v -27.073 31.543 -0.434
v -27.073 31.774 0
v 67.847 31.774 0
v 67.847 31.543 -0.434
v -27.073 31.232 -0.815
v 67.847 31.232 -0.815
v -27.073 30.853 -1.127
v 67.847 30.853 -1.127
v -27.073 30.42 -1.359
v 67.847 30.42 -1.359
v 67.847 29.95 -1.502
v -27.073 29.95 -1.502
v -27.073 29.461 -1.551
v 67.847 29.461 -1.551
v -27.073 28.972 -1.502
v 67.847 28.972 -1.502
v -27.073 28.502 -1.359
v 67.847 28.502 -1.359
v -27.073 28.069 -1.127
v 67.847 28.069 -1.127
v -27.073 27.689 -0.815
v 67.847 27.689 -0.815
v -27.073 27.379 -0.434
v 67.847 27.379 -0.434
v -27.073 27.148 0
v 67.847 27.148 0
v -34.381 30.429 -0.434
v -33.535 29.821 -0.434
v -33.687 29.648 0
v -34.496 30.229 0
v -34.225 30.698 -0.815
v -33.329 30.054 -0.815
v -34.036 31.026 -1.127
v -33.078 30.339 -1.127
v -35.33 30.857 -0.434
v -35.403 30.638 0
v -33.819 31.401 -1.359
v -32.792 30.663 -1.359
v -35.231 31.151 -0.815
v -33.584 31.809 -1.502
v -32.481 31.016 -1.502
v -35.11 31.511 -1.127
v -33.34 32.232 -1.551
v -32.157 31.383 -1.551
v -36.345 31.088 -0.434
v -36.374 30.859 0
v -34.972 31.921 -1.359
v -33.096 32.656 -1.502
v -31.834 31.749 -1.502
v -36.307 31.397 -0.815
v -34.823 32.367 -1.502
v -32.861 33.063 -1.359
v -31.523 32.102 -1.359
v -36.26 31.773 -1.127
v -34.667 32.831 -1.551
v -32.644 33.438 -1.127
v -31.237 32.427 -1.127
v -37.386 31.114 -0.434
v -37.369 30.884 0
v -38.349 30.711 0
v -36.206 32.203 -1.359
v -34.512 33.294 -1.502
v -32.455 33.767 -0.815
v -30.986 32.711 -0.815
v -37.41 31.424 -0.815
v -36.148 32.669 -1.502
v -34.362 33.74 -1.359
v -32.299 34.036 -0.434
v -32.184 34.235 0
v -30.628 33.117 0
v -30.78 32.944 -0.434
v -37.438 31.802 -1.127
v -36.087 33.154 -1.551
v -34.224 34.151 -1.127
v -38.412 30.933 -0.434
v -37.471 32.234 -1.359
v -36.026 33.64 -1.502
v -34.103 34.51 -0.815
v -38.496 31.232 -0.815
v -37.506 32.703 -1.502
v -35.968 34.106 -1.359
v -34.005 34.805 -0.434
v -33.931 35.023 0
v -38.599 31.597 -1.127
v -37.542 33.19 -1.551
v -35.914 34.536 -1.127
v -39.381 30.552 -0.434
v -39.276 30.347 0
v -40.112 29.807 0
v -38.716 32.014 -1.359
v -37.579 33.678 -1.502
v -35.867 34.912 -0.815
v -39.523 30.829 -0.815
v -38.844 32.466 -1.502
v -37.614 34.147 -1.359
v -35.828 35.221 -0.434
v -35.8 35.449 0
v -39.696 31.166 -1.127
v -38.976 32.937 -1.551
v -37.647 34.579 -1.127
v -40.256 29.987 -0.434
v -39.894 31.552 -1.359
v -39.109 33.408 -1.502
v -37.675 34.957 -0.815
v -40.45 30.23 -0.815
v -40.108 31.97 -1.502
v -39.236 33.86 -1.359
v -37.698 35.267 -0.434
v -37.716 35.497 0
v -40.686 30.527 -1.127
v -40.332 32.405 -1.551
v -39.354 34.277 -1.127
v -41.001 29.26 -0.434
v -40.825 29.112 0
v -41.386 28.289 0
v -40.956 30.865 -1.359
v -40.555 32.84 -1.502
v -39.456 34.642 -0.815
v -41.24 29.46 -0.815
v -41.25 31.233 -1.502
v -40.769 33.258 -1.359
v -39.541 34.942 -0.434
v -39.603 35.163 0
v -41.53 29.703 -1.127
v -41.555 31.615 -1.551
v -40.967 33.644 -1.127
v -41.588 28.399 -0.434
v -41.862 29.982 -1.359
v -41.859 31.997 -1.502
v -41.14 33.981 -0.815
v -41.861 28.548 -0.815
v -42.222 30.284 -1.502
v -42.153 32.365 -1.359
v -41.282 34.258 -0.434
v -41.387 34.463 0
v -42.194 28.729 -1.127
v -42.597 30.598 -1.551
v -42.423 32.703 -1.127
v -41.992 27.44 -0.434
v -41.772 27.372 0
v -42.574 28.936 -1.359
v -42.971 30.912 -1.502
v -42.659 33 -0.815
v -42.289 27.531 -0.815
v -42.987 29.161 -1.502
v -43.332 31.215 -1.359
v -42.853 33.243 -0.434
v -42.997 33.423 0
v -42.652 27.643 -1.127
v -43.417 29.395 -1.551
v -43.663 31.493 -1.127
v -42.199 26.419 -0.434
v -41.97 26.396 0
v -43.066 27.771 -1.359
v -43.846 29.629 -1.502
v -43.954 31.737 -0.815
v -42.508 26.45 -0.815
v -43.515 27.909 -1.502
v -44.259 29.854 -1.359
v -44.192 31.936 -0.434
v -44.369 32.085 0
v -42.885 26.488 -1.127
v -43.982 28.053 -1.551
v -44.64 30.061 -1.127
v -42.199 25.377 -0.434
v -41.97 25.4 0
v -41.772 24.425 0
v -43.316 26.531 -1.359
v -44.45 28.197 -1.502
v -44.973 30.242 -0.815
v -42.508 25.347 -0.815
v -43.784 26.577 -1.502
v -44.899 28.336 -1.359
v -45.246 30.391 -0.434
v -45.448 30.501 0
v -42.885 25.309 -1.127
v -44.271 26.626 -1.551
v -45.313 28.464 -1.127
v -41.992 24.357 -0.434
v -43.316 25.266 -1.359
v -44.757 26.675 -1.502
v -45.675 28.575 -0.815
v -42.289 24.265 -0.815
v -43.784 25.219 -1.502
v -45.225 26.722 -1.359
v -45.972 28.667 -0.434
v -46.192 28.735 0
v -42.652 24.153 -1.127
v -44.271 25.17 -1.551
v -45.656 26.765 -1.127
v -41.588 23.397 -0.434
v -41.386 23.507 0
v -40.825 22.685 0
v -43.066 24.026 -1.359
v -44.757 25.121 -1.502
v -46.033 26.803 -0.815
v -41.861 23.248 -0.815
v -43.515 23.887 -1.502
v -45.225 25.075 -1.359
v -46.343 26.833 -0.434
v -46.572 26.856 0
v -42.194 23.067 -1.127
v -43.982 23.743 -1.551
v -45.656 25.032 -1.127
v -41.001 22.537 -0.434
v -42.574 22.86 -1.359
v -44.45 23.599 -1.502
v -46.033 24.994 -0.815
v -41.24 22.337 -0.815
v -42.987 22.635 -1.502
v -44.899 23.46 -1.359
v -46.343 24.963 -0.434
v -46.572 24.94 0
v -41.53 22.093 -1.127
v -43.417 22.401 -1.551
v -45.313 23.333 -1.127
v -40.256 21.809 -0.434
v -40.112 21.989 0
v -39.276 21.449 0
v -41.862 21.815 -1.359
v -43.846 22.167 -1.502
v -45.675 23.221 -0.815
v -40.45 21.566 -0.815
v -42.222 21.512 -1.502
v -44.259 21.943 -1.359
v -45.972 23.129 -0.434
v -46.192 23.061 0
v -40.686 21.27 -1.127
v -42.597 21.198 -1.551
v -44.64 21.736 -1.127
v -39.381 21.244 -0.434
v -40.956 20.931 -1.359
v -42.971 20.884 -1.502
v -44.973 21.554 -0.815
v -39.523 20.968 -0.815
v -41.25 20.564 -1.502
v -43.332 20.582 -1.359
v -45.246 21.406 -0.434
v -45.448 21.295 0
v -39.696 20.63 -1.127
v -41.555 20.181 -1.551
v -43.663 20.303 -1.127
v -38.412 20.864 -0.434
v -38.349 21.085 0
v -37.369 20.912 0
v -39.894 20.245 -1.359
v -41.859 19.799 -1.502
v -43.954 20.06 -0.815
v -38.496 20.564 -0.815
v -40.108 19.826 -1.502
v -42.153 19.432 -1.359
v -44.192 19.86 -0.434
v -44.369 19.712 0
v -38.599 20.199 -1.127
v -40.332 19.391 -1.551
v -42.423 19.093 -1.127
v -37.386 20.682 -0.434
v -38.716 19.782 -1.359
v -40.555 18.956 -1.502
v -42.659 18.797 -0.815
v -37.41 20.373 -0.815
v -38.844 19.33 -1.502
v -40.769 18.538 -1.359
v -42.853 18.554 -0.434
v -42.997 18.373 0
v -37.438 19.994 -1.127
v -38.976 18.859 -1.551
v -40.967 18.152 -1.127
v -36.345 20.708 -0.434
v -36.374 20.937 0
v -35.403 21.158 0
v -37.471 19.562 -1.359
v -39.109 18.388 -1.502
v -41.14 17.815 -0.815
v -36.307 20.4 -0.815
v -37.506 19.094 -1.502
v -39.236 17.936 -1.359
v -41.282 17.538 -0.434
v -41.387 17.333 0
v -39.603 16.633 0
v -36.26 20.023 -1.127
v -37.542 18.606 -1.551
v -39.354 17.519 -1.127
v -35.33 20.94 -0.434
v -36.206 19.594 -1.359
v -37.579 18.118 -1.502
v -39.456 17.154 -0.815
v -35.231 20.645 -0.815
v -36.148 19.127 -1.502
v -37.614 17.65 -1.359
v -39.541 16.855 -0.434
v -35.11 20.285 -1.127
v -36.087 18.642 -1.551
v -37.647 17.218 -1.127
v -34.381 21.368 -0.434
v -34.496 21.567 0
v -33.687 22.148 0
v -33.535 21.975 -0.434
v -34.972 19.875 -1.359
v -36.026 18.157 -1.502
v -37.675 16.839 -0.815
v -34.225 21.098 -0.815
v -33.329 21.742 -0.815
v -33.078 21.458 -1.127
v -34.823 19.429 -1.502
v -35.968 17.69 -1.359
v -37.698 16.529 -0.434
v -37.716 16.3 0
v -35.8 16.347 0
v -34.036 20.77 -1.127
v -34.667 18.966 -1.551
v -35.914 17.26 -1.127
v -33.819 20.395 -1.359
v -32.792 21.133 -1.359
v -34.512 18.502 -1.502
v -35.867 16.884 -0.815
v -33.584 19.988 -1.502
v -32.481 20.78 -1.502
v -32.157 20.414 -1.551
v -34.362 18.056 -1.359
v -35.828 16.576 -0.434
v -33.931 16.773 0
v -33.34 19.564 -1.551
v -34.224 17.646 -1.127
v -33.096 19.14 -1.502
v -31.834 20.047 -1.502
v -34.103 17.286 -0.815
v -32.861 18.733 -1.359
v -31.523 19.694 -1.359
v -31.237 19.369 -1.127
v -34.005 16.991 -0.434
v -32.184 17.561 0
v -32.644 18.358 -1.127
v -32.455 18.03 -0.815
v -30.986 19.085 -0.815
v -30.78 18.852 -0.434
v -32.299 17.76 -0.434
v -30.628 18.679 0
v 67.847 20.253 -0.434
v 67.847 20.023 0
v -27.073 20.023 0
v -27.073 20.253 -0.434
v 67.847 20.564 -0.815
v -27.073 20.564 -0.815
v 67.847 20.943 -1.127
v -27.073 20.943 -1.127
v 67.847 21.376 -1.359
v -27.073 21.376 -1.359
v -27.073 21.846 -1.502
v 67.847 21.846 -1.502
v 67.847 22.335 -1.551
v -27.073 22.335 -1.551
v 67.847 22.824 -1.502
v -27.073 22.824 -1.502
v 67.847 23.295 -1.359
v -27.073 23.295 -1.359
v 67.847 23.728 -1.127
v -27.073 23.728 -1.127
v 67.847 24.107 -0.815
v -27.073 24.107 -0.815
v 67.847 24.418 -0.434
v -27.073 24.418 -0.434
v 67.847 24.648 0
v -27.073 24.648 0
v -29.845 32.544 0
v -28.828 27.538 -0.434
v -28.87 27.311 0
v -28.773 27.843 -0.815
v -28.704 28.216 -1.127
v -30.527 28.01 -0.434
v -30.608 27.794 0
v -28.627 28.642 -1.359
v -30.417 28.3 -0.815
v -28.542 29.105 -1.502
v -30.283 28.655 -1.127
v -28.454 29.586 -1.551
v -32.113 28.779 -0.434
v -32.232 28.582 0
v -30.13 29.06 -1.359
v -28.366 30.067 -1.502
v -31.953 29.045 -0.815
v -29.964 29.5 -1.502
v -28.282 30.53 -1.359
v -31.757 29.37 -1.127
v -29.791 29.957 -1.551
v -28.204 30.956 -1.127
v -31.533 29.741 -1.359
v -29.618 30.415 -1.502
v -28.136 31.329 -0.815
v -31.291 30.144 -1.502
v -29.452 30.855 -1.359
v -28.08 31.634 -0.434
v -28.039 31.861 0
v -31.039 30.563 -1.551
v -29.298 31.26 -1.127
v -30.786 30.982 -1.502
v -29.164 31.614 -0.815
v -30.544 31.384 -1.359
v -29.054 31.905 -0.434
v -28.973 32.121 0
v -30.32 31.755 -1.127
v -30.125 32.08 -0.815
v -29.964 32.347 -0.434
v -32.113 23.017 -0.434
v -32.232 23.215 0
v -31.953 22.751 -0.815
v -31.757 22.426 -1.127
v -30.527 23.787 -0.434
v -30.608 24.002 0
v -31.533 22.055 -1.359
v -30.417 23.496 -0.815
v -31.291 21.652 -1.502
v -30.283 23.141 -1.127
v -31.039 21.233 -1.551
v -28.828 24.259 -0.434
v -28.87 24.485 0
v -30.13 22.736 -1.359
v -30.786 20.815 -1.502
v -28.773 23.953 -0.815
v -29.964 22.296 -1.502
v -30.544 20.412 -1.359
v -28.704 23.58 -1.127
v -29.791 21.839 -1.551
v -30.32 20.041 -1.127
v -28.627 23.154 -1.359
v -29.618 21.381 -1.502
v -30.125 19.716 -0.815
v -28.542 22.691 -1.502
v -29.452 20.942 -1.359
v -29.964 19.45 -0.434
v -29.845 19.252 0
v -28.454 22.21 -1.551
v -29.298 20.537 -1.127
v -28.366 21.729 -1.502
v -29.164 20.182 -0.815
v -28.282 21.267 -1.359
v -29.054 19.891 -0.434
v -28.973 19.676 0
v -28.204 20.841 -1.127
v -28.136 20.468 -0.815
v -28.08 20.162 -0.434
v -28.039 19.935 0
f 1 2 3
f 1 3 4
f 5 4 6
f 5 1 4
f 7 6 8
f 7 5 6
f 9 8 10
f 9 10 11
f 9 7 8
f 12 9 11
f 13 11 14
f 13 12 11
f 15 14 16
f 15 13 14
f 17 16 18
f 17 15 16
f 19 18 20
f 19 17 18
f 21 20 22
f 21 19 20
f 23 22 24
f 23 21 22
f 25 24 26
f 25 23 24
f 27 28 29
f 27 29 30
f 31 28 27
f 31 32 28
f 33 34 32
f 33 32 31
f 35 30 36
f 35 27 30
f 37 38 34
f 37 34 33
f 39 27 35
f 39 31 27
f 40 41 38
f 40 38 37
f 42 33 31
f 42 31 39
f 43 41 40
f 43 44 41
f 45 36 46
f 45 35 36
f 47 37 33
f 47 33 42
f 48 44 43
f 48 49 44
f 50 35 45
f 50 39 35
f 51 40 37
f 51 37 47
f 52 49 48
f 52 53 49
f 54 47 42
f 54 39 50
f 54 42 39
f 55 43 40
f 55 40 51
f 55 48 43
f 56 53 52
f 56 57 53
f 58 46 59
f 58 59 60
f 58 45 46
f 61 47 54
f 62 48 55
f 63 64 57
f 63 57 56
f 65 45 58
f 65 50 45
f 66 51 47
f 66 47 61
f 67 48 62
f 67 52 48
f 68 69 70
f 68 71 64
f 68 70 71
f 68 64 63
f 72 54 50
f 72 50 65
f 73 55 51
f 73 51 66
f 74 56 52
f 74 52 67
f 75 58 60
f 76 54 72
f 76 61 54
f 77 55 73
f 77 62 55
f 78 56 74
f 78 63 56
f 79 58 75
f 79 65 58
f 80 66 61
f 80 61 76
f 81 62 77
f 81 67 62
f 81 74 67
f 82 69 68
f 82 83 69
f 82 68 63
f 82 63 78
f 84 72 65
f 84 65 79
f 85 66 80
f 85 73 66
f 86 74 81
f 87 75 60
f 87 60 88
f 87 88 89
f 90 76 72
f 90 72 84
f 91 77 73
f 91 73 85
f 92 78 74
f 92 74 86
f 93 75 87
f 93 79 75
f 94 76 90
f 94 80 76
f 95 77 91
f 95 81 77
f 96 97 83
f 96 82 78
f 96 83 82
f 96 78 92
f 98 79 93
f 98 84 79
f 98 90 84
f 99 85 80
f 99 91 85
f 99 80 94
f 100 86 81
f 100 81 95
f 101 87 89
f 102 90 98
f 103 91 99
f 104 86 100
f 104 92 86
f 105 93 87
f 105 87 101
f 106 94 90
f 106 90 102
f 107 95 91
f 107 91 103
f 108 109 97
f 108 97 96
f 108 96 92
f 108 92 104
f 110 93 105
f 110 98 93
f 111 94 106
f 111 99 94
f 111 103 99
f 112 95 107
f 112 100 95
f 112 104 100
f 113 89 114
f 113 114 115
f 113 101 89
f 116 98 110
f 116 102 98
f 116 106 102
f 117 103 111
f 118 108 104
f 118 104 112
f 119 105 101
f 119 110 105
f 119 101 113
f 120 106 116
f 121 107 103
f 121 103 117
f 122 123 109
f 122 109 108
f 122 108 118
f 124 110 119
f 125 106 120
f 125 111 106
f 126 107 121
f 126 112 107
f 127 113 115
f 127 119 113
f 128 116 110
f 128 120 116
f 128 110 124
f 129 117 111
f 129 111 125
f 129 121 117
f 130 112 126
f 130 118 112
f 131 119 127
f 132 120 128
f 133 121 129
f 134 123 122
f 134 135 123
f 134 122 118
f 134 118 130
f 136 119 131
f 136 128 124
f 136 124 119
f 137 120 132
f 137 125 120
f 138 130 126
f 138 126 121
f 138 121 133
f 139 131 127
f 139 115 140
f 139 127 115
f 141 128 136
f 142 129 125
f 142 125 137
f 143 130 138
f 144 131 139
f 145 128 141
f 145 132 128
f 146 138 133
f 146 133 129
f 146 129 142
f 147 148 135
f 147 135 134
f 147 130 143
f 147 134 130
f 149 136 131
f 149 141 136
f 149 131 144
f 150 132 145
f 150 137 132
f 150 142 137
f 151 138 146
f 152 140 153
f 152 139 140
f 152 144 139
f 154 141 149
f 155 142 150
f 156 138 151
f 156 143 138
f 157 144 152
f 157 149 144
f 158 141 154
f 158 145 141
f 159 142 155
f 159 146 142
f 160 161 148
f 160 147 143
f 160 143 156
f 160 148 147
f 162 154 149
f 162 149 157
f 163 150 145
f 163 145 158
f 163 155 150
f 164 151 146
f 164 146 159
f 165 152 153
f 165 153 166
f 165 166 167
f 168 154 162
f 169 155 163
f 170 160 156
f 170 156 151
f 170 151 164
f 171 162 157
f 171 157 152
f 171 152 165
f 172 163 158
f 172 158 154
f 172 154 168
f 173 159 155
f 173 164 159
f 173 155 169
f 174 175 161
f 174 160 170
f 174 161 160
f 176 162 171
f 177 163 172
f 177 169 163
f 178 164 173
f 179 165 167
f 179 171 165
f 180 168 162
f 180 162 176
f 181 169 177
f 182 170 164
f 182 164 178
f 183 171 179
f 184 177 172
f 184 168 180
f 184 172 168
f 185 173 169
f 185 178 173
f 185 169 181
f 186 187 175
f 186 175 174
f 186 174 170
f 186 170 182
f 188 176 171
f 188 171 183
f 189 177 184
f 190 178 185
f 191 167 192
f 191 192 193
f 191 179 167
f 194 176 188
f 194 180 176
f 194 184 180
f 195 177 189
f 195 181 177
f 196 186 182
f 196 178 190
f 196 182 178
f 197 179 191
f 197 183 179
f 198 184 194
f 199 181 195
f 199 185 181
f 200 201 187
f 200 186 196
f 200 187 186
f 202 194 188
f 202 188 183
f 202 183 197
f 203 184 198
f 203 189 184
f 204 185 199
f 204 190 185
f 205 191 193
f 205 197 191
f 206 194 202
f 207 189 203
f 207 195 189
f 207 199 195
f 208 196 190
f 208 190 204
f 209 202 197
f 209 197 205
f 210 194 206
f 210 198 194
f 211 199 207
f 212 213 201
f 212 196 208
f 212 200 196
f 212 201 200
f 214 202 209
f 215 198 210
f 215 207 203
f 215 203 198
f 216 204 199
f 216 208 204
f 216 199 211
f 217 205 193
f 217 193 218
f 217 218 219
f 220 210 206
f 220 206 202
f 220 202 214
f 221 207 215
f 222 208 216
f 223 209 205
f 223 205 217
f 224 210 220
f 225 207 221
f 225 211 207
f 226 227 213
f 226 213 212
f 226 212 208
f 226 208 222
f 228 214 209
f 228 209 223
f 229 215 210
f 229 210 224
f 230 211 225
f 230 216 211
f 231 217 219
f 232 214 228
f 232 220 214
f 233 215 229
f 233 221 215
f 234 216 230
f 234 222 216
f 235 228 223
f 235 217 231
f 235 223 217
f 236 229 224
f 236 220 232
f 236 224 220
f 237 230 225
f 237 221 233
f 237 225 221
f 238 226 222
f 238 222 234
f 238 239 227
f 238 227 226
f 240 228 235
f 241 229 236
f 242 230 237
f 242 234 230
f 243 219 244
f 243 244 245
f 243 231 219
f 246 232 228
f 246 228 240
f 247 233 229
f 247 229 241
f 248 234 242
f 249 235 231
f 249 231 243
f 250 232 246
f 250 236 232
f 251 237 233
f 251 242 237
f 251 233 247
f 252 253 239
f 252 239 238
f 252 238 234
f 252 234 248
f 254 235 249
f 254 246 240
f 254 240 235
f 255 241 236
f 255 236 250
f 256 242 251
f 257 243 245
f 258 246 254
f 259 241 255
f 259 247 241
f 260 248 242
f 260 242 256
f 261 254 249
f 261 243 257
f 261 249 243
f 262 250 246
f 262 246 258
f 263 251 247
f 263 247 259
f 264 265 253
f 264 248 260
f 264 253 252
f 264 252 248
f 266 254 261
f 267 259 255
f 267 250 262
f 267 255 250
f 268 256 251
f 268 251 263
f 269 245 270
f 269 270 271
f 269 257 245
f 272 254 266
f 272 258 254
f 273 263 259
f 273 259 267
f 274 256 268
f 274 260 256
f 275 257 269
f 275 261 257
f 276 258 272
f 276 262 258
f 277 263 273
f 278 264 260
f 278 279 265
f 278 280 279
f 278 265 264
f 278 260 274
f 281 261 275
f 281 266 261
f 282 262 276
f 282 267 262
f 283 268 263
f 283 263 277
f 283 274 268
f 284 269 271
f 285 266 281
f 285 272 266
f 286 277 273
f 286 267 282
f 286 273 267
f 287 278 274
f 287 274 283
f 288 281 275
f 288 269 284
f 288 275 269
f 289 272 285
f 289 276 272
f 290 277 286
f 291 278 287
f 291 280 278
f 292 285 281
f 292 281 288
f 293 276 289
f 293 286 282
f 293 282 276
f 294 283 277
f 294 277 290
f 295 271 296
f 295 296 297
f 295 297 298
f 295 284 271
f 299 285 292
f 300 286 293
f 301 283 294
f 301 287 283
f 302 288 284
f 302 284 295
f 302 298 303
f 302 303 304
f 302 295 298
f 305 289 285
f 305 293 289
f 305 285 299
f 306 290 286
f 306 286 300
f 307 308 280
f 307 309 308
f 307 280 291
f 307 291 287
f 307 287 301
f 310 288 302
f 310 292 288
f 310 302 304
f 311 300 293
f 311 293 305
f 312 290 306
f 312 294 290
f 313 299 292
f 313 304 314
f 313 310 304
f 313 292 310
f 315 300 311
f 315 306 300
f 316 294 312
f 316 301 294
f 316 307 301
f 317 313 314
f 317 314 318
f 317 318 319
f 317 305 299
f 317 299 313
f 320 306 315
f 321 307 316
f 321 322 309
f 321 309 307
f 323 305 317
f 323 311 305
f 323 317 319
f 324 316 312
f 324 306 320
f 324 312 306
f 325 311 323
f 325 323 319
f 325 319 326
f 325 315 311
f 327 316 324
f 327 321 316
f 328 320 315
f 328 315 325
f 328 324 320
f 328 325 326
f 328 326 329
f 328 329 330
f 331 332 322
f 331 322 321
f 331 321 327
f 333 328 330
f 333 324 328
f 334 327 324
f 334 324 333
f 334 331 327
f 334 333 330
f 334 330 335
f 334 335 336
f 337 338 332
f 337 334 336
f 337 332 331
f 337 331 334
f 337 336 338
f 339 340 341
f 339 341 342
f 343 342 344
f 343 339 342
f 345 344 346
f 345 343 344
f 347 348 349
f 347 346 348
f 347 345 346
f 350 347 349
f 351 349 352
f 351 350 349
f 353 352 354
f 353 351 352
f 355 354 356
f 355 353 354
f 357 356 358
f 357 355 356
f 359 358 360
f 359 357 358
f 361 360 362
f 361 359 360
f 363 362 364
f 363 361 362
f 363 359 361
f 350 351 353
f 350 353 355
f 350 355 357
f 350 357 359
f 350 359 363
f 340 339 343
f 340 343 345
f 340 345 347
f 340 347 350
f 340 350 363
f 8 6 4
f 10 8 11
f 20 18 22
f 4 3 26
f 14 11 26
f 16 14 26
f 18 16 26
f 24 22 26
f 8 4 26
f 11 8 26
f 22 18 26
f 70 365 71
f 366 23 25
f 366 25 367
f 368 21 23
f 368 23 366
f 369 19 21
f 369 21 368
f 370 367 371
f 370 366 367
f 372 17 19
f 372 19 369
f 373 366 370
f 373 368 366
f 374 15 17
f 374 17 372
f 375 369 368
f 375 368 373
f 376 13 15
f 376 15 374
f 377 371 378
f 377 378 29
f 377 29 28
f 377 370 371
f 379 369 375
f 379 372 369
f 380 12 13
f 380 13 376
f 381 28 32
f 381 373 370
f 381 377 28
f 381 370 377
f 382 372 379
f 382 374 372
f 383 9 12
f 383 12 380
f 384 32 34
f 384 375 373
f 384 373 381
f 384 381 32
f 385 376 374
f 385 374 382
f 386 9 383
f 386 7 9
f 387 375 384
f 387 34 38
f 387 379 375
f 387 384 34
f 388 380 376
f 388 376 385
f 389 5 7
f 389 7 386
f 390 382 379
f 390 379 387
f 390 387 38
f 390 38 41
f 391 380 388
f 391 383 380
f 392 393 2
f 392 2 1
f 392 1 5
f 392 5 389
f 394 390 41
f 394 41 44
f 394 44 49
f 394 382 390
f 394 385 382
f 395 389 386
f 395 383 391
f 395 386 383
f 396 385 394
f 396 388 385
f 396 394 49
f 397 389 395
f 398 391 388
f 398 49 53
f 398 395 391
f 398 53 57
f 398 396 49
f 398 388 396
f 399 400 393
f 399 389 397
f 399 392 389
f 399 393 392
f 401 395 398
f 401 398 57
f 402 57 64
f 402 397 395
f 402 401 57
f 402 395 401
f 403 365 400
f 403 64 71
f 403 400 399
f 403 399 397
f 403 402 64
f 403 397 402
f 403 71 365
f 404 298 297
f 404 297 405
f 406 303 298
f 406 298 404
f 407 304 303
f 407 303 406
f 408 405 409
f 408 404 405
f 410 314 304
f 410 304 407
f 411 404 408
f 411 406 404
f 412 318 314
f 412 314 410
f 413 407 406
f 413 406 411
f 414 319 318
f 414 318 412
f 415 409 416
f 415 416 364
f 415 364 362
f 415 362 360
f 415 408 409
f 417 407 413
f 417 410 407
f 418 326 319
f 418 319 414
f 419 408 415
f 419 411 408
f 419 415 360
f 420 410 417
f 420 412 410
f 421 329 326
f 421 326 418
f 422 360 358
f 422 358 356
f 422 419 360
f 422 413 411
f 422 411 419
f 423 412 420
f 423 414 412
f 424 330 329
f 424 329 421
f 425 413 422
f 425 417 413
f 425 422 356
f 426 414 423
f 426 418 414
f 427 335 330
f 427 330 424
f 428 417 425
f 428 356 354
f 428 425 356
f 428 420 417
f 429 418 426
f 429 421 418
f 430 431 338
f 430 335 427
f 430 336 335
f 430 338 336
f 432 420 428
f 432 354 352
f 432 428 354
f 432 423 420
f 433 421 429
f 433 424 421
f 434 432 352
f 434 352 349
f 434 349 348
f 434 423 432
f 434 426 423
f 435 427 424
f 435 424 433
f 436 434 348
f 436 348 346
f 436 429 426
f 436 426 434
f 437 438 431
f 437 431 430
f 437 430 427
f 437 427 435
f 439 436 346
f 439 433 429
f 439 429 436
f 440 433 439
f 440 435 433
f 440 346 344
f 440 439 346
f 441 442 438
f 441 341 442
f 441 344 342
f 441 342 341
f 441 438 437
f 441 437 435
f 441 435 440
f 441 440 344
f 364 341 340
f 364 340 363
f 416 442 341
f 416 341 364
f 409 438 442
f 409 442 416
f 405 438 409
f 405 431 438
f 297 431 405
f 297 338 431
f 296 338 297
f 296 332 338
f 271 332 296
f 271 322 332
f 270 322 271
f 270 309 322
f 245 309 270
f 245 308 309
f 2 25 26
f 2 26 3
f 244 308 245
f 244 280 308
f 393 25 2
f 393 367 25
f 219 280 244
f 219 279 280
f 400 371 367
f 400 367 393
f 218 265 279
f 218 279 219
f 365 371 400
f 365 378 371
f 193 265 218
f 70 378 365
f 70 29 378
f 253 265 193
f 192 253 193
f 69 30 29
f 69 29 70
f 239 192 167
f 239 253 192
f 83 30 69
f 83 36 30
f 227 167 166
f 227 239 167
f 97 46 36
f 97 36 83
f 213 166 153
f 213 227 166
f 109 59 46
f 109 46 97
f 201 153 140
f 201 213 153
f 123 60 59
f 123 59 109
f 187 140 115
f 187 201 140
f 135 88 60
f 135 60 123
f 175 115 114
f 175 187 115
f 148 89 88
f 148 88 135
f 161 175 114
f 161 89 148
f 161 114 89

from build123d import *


with BuildPart() as f3:
    # F3: sweep along a path in F0
    with BuildLine(Plane.XY) as f3_path:
        Line((67.8468741477, 27.1481485665), (-27.0727876186, 27.1481485665))
        ThreePointArc((-27.0727876186, 27.1481485665), (-30.6083215245, 27.7940050995), (-33.6871658963, 29.6481485665))
        ThreePointArc((-33.6871658963, 29.6481485665), (-41.9943550351, 25.8981485665), (-33.6871658963, 22.1481485665))
        ThreePointArc((-33.6871658963, 22.1481485665), (-30.6083215245, 24.0022920334), (-27.0727876186, 24.6481485665))
        Line((-27.0727876186, 24.6481485665), (67.8468741477, 24.6481485665))
    # F2 (on plane+point) → F3 (sweep)
    with BuildSketch(Plane.YZ.offset(67.8468741477)):
        with BuildLine():
            Line((24.6481485665, 0), (20.0226833864, 0))
            ThreePointArc((20.0226833864, 0), (22.3354159764, -1.5506486599), (24.6481485665, 0))
        make_face()
    sweep(path=f3_path.line)


solid = f3.part
